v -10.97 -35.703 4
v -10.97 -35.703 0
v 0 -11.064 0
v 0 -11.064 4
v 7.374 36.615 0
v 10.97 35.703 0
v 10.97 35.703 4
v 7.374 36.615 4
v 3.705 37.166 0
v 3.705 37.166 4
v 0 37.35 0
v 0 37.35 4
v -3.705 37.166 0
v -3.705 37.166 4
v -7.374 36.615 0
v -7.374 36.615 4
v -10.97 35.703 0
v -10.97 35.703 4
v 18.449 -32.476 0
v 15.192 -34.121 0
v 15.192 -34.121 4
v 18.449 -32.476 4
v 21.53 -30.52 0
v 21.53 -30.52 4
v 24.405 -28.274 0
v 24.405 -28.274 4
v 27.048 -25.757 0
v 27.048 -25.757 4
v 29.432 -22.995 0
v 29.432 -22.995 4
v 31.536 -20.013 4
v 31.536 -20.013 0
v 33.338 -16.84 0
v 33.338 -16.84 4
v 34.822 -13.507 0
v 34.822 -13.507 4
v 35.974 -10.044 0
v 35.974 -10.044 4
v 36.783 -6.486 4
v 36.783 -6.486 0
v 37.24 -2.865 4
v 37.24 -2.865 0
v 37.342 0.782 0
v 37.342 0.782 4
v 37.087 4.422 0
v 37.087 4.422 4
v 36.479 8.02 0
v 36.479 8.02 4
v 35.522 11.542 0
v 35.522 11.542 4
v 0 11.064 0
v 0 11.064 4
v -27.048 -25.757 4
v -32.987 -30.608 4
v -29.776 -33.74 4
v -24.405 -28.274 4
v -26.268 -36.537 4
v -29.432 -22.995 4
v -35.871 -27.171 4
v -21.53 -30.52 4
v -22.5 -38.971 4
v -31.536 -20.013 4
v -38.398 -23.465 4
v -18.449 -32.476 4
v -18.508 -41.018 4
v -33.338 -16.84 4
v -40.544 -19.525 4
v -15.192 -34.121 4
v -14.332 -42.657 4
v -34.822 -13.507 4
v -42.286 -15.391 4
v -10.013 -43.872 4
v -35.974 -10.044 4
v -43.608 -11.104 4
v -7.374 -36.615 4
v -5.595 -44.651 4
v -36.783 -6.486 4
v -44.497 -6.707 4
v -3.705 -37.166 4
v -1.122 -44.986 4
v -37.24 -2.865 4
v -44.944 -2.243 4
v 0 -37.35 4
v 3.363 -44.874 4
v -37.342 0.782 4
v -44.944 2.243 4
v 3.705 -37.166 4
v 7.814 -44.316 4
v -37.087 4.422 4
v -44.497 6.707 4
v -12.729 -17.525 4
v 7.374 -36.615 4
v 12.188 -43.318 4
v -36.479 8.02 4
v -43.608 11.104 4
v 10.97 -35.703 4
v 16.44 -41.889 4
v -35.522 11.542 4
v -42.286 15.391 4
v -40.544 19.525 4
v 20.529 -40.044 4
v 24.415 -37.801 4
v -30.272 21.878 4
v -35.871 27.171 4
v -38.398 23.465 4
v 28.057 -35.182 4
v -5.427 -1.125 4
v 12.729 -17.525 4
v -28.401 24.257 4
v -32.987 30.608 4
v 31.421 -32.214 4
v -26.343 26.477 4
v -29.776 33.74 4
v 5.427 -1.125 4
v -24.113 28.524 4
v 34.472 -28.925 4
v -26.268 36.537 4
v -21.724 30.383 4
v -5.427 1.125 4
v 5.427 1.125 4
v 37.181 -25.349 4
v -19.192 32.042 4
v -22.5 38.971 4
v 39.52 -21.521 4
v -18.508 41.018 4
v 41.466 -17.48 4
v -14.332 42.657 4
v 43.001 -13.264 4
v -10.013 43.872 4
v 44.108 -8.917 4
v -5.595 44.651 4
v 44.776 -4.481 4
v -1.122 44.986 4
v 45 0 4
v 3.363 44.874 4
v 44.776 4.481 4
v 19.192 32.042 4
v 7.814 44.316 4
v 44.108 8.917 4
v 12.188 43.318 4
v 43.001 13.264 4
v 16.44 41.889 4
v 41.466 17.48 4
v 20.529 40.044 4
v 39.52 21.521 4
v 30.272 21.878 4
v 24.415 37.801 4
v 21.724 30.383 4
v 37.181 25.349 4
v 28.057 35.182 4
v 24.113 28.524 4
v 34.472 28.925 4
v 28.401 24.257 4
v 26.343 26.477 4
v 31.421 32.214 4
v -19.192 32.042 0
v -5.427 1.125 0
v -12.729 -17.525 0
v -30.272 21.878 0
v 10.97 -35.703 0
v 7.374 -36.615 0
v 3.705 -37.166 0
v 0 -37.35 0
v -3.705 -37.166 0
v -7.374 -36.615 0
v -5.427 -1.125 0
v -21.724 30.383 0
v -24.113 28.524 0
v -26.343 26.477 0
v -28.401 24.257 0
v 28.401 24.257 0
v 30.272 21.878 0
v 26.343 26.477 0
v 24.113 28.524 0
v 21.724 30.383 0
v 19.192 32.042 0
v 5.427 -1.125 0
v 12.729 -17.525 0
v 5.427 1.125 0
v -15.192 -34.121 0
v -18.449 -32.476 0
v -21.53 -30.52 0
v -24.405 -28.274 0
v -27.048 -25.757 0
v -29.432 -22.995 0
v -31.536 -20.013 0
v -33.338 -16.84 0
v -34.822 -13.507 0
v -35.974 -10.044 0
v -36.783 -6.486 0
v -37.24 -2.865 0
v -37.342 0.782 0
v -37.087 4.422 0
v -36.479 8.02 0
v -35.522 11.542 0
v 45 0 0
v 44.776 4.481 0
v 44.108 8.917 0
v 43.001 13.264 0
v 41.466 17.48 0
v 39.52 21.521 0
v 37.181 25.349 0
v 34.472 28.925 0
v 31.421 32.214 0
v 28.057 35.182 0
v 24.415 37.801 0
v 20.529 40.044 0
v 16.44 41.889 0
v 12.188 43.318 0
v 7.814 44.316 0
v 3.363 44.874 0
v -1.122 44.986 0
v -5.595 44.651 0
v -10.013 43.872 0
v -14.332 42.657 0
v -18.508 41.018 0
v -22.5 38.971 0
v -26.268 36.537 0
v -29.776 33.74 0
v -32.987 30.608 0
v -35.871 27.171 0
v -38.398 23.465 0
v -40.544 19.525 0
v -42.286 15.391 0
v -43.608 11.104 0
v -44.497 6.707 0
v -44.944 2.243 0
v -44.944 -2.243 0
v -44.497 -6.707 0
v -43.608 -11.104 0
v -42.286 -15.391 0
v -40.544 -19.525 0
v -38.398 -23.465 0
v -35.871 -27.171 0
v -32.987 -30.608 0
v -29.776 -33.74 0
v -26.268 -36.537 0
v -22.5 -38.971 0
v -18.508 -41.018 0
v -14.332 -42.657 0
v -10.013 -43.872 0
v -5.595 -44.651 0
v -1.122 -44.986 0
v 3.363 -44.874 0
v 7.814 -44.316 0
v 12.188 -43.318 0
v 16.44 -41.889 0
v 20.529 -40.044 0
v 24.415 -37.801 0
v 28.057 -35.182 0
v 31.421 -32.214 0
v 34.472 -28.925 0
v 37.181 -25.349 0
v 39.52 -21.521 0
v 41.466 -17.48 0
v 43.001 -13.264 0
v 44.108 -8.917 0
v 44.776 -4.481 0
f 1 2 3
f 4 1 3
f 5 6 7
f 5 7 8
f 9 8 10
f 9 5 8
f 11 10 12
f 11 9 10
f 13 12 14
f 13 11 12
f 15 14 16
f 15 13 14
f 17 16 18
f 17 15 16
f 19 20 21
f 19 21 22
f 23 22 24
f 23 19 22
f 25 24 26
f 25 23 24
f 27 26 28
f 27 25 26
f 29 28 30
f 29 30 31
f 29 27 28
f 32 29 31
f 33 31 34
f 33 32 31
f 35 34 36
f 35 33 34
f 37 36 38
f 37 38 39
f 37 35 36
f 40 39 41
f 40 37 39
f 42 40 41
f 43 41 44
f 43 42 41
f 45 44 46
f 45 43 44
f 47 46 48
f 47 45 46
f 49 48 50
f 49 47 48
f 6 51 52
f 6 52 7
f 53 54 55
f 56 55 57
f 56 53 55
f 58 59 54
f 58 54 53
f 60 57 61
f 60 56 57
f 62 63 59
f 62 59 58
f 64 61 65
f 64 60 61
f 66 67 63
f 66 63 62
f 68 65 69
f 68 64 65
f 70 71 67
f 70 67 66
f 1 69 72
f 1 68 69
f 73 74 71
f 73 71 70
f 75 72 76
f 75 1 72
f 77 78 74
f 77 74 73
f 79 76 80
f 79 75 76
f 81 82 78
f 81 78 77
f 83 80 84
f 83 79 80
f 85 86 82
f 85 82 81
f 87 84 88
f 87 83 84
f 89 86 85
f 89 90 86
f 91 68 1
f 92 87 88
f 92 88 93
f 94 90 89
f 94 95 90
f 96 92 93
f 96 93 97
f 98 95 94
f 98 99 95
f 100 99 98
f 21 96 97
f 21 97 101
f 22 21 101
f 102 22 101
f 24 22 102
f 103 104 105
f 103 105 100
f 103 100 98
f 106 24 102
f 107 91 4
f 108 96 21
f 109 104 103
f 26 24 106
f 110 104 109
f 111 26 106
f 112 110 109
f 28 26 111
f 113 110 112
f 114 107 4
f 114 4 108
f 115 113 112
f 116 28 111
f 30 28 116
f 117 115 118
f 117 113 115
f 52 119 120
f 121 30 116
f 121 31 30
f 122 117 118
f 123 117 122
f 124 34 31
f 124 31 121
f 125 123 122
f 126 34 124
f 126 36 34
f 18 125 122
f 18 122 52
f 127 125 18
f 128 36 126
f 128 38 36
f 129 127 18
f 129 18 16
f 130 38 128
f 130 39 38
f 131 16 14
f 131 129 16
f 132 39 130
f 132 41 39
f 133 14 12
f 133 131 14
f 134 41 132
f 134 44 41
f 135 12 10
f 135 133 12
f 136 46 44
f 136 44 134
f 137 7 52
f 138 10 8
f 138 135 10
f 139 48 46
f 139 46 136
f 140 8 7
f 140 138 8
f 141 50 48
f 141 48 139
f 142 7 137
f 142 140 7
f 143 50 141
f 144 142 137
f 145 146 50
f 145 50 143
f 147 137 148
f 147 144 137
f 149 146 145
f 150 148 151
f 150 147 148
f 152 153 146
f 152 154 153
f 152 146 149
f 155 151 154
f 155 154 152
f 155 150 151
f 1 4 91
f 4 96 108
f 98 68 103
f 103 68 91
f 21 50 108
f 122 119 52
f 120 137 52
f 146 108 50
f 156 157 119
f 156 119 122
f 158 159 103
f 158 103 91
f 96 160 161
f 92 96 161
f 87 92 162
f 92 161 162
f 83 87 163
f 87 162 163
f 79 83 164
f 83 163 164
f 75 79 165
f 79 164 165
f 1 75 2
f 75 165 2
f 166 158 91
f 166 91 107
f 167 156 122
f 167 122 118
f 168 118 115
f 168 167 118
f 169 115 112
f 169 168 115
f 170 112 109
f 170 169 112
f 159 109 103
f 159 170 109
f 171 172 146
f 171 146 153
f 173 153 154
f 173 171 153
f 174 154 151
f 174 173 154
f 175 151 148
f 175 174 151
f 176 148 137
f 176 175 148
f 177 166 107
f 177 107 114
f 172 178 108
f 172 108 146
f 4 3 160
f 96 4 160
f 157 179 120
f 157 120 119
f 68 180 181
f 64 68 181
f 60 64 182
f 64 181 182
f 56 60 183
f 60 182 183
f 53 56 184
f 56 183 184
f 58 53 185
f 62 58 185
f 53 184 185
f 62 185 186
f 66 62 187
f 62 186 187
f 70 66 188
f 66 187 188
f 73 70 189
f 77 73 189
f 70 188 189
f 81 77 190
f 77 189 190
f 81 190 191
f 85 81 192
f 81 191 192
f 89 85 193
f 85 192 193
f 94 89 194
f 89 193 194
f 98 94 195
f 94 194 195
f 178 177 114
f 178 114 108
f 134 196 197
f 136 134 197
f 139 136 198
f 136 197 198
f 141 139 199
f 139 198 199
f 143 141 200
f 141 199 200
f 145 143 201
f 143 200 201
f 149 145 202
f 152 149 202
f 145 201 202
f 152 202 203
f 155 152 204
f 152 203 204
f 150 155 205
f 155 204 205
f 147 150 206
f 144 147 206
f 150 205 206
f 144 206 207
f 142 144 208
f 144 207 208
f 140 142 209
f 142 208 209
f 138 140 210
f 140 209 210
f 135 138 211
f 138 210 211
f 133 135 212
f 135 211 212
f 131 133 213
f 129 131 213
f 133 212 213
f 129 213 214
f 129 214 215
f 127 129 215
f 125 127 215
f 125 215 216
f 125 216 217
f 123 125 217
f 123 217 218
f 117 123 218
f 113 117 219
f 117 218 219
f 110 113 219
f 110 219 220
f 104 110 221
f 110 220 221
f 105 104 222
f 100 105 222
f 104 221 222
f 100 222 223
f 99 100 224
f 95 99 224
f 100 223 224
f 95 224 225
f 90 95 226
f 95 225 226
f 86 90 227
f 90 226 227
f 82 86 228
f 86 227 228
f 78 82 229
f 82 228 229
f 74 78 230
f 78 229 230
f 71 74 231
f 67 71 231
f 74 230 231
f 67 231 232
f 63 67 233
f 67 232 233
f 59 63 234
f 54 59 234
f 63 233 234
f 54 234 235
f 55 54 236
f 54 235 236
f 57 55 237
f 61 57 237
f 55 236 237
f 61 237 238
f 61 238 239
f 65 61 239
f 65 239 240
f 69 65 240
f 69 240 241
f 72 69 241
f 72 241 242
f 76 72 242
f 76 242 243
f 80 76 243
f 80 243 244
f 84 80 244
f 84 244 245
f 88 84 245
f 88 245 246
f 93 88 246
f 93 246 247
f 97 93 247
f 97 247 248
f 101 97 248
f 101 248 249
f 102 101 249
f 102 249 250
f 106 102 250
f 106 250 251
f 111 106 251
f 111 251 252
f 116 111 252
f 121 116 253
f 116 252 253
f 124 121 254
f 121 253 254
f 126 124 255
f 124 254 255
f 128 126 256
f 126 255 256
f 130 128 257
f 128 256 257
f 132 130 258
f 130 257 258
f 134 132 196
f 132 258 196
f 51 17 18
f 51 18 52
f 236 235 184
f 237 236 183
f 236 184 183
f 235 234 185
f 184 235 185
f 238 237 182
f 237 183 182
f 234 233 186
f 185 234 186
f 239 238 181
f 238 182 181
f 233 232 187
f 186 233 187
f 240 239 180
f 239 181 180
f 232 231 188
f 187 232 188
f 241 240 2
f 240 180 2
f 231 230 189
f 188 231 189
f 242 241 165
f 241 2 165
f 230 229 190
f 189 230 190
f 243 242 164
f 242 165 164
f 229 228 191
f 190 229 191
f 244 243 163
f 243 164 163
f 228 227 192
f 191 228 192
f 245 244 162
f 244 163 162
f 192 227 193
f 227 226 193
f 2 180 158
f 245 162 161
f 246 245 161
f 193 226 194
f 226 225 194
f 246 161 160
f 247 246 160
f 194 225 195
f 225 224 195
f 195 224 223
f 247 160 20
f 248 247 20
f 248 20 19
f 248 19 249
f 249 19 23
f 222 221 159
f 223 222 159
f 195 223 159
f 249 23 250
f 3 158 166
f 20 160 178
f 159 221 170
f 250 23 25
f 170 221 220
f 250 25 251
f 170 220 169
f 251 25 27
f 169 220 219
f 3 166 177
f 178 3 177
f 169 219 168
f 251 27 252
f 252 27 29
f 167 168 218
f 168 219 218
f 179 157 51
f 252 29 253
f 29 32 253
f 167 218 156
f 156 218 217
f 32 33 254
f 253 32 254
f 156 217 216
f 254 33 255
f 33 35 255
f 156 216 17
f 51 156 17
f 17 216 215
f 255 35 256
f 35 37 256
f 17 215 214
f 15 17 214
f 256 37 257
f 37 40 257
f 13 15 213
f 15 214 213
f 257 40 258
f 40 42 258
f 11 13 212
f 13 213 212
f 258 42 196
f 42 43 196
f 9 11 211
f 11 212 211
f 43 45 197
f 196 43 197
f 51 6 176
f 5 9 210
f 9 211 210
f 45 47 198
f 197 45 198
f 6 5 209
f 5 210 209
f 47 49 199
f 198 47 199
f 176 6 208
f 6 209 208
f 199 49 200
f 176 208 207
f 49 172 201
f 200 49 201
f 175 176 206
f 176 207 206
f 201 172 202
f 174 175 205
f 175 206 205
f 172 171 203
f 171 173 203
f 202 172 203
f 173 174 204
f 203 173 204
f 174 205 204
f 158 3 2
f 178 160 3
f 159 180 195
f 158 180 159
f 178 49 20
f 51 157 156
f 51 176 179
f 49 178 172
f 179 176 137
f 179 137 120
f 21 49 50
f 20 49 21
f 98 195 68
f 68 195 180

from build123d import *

# Parameters (mm, degrees)
SKETCH1_R           = 45
BOSS_EXTRUDE1_DEPTH = 4


with BuildPart() as part:
    # Sketch1 → Boss-Extrude1 (new body)
    with BuildSketch(Plane.XY):
        Circle(SKETCH1_R)
        with BuildLine():
            Line((-10.969996065, 35.702684582), (0, 11.06367001))
            Line((0, 11.06367001), (10.969996065, 35.702684582))
            ThreePointArc((10.969996065, 35.702684582), (0, 37.35), (-10.969996065, 35.702684582))
        make_face(mode=Mode.SUBTRACT)
        with BuildLine():
            Line((-10.969996065, -35.702684582), (0, -11.06367001))
            Line((0, -11.06367001), (10.969996065, -35.702684582))
            ThreePointArc((10.969996065, -35.702684582), (0, -37.35), (-10.969996065, -35.702684582))
        make_face(mode=Mode.SUBTRACT)
        with BuildLine():
            Line((-35.521960884, 11.54178474), (-15.191613619, -34.120922843))
            ThreePointArc((-15.191613619, -34.120922843), (-34.120922843, -15.191613619), (-35.521960884, 11.54178474))
        make_face(mode=Mode.SUBTRACT)
        with BuildLine():
            Line((-30.272016712, 21.877557089), (-12.728681992, -17.525417828))
            Line((-12.728681992, -17.525417828), (-5.426745524, -1.125))
            Line((-5.426745524, -1.125), (5.426745524, -1.125))
            Line((5.426745524, -1.125), (12.728681992, -17.525417828))
            Line((12.728681992, -17.525417828), (30.272016712, 21.877557089))
            ThreePointArc((30.272016712, 21.877557089), (25.248745429, 27.523142159), (19.191905184, 32.042054794))
            Line((19.191905184, 32.042054794), (5.426745524, 1.125))
            Line((5.426745524, 1.125), (-5.426745524, 1.125))
            Line((-5.426745524, 1.125), (-19.191905184, 32.042054794))
            ThreePointArc((-19.191905184, 32.042054794), (-25.248745429, 27.523142159), (-30.272016712, 21.877557089))
        make_face(mode=Mode.SUBTRACT)
        with BuildLine():
            Line((35.521960884, 11.54178474), (15.191613619, -34.120922843))
            ThreePointArc((15.191613619, -34.120922843), (34.120922843, -15.191613619), (35.521960884, 11.54178474))
        make_face(mode=Mode.SUBTRACT)
    extrude(amount=BOSS_EXTRUDE1_DEPTH)


solid = part.part
